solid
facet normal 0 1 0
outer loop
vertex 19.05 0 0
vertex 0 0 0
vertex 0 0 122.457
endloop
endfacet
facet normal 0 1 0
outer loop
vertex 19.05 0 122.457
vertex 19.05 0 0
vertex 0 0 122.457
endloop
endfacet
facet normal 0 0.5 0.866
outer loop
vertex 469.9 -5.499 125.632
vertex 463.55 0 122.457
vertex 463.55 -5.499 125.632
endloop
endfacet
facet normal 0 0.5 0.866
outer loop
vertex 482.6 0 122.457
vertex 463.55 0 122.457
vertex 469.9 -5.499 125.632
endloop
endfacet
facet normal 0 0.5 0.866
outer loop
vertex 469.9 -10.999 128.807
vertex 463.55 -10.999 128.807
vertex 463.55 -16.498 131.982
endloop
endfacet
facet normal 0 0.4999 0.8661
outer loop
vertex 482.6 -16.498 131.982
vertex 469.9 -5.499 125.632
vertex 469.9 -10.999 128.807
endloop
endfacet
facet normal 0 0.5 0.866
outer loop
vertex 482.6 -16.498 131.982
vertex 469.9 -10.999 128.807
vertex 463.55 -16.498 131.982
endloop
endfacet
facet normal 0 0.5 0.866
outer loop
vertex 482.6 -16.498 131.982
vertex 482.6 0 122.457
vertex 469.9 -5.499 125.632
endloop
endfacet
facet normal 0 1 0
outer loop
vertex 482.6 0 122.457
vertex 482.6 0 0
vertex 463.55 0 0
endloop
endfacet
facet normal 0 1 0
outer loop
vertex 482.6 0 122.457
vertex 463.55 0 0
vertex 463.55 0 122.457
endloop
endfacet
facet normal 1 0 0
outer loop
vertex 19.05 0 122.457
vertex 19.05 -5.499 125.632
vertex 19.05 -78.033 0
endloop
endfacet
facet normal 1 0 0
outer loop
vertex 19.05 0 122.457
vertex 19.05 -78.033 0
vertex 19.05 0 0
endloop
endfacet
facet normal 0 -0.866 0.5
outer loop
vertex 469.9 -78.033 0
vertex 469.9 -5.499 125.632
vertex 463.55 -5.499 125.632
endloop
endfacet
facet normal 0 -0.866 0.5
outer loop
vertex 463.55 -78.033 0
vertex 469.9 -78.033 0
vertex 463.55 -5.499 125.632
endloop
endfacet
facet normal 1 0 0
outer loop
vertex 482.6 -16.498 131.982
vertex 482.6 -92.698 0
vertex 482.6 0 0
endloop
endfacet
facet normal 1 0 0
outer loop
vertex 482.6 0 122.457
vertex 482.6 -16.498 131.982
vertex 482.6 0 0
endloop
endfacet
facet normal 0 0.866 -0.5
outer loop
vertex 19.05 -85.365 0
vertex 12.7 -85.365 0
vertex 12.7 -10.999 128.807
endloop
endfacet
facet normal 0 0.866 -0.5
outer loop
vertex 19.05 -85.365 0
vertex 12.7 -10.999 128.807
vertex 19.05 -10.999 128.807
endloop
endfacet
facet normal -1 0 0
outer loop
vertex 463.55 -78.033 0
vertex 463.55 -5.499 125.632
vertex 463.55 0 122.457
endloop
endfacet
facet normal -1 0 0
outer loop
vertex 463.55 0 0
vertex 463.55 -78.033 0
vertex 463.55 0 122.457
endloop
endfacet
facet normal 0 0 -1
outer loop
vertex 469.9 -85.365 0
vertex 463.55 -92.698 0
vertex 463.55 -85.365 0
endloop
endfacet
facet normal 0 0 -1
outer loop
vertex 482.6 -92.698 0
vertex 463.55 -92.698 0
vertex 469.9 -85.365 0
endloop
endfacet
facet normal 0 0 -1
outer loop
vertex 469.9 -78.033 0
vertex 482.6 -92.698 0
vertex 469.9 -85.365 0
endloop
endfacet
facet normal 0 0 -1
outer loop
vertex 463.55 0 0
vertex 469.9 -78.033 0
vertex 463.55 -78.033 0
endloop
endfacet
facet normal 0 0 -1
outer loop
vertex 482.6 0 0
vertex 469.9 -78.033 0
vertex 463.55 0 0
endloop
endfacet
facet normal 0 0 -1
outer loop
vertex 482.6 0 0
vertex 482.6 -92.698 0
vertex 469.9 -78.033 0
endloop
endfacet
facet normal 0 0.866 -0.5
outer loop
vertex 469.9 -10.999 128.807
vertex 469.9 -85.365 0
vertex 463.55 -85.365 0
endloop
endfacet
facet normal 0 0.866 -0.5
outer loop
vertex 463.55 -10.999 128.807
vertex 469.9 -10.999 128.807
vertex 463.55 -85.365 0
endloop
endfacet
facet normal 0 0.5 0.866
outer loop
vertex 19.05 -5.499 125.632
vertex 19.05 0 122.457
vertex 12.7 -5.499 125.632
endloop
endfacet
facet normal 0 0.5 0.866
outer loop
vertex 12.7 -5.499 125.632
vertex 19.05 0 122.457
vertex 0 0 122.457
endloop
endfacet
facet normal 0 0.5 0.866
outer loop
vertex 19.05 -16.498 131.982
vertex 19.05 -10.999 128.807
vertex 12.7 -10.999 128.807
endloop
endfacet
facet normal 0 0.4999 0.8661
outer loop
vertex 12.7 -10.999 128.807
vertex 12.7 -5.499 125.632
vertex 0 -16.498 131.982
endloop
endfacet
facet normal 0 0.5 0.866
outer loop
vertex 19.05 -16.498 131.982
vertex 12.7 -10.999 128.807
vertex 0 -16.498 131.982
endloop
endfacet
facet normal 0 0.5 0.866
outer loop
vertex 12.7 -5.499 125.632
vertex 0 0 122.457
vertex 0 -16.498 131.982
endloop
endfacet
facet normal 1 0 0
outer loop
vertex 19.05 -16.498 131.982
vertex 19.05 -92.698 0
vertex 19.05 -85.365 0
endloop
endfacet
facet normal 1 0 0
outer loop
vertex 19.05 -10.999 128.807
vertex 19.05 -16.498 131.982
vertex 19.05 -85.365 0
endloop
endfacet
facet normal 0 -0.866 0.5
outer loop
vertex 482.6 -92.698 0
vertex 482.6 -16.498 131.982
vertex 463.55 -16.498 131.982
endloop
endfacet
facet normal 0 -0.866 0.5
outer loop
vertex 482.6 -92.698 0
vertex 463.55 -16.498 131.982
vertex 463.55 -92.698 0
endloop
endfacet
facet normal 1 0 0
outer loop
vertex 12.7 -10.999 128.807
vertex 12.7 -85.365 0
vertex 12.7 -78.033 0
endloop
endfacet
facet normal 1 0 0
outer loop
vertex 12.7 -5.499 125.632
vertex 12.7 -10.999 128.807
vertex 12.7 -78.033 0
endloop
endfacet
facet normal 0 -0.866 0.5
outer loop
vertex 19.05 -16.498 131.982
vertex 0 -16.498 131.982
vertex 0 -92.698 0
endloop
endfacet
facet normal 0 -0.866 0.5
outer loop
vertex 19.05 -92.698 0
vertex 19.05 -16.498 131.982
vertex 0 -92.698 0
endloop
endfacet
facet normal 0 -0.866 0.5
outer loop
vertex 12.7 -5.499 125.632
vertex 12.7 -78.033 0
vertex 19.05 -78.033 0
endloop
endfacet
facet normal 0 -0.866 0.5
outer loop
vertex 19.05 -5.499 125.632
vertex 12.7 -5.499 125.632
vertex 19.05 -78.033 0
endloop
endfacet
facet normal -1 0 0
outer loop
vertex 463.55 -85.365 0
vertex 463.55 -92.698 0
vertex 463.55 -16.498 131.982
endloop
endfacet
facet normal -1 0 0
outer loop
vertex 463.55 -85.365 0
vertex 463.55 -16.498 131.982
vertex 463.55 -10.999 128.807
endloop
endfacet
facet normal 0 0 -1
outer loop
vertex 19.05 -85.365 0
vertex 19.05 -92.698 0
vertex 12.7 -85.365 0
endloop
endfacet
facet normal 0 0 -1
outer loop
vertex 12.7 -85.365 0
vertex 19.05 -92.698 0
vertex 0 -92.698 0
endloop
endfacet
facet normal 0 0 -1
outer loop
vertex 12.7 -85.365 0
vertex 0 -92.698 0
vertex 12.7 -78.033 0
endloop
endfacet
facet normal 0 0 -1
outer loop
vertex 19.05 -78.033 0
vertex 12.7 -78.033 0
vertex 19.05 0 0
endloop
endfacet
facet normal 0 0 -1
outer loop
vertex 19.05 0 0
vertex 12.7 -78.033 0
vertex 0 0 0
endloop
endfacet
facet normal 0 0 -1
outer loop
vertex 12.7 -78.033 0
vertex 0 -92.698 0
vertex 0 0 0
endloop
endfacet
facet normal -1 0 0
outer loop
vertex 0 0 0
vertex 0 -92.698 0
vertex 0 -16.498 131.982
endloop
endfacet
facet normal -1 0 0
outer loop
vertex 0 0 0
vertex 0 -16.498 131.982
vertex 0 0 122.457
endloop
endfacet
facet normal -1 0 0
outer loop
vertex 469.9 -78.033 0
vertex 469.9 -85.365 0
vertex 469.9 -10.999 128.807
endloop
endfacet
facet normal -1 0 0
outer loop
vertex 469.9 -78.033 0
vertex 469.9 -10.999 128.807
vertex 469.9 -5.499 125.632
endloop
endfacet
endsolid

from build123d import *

# Parameters (mm, degrees)
F1_DEPTH = 19.05
F5_W     = 6.35
F5_H     = 6.35
F6_DEPTH = 152.4


with BuildPart() as f1:
    # F0 (on Right) → F1 (new body)
    with BuildSketch(Plane.YZ):
        Polygon((-92.6977839421, 0), (0, 0), (0, 122.4572715367), (-16.4977839421, 131.9822715367), align=None)
    extrude(amount=F1_DEPTH)

    # F5 (on offset) → F6 (cut)
    with BuildSketch(Plane(origin=(0, 53.0255540145, 91.8429536526), x_dir=(1, 0, 0), z_dir=(0, 0.5, 0.8660254038))):
        with Locations((15.875, -70.7536357684)):
            Rectangle(F5_W, F5_H)
    extrude(amount=-F6_DEPTH, mode=Mode.SUBTRACT)


with BuildPart() as f8_1:
    # F8: instance of F1
    add(f1.part.mirror(Plane.YZ.offset(241.3)))


solid = Compound([f1.part, f8_1.part])
